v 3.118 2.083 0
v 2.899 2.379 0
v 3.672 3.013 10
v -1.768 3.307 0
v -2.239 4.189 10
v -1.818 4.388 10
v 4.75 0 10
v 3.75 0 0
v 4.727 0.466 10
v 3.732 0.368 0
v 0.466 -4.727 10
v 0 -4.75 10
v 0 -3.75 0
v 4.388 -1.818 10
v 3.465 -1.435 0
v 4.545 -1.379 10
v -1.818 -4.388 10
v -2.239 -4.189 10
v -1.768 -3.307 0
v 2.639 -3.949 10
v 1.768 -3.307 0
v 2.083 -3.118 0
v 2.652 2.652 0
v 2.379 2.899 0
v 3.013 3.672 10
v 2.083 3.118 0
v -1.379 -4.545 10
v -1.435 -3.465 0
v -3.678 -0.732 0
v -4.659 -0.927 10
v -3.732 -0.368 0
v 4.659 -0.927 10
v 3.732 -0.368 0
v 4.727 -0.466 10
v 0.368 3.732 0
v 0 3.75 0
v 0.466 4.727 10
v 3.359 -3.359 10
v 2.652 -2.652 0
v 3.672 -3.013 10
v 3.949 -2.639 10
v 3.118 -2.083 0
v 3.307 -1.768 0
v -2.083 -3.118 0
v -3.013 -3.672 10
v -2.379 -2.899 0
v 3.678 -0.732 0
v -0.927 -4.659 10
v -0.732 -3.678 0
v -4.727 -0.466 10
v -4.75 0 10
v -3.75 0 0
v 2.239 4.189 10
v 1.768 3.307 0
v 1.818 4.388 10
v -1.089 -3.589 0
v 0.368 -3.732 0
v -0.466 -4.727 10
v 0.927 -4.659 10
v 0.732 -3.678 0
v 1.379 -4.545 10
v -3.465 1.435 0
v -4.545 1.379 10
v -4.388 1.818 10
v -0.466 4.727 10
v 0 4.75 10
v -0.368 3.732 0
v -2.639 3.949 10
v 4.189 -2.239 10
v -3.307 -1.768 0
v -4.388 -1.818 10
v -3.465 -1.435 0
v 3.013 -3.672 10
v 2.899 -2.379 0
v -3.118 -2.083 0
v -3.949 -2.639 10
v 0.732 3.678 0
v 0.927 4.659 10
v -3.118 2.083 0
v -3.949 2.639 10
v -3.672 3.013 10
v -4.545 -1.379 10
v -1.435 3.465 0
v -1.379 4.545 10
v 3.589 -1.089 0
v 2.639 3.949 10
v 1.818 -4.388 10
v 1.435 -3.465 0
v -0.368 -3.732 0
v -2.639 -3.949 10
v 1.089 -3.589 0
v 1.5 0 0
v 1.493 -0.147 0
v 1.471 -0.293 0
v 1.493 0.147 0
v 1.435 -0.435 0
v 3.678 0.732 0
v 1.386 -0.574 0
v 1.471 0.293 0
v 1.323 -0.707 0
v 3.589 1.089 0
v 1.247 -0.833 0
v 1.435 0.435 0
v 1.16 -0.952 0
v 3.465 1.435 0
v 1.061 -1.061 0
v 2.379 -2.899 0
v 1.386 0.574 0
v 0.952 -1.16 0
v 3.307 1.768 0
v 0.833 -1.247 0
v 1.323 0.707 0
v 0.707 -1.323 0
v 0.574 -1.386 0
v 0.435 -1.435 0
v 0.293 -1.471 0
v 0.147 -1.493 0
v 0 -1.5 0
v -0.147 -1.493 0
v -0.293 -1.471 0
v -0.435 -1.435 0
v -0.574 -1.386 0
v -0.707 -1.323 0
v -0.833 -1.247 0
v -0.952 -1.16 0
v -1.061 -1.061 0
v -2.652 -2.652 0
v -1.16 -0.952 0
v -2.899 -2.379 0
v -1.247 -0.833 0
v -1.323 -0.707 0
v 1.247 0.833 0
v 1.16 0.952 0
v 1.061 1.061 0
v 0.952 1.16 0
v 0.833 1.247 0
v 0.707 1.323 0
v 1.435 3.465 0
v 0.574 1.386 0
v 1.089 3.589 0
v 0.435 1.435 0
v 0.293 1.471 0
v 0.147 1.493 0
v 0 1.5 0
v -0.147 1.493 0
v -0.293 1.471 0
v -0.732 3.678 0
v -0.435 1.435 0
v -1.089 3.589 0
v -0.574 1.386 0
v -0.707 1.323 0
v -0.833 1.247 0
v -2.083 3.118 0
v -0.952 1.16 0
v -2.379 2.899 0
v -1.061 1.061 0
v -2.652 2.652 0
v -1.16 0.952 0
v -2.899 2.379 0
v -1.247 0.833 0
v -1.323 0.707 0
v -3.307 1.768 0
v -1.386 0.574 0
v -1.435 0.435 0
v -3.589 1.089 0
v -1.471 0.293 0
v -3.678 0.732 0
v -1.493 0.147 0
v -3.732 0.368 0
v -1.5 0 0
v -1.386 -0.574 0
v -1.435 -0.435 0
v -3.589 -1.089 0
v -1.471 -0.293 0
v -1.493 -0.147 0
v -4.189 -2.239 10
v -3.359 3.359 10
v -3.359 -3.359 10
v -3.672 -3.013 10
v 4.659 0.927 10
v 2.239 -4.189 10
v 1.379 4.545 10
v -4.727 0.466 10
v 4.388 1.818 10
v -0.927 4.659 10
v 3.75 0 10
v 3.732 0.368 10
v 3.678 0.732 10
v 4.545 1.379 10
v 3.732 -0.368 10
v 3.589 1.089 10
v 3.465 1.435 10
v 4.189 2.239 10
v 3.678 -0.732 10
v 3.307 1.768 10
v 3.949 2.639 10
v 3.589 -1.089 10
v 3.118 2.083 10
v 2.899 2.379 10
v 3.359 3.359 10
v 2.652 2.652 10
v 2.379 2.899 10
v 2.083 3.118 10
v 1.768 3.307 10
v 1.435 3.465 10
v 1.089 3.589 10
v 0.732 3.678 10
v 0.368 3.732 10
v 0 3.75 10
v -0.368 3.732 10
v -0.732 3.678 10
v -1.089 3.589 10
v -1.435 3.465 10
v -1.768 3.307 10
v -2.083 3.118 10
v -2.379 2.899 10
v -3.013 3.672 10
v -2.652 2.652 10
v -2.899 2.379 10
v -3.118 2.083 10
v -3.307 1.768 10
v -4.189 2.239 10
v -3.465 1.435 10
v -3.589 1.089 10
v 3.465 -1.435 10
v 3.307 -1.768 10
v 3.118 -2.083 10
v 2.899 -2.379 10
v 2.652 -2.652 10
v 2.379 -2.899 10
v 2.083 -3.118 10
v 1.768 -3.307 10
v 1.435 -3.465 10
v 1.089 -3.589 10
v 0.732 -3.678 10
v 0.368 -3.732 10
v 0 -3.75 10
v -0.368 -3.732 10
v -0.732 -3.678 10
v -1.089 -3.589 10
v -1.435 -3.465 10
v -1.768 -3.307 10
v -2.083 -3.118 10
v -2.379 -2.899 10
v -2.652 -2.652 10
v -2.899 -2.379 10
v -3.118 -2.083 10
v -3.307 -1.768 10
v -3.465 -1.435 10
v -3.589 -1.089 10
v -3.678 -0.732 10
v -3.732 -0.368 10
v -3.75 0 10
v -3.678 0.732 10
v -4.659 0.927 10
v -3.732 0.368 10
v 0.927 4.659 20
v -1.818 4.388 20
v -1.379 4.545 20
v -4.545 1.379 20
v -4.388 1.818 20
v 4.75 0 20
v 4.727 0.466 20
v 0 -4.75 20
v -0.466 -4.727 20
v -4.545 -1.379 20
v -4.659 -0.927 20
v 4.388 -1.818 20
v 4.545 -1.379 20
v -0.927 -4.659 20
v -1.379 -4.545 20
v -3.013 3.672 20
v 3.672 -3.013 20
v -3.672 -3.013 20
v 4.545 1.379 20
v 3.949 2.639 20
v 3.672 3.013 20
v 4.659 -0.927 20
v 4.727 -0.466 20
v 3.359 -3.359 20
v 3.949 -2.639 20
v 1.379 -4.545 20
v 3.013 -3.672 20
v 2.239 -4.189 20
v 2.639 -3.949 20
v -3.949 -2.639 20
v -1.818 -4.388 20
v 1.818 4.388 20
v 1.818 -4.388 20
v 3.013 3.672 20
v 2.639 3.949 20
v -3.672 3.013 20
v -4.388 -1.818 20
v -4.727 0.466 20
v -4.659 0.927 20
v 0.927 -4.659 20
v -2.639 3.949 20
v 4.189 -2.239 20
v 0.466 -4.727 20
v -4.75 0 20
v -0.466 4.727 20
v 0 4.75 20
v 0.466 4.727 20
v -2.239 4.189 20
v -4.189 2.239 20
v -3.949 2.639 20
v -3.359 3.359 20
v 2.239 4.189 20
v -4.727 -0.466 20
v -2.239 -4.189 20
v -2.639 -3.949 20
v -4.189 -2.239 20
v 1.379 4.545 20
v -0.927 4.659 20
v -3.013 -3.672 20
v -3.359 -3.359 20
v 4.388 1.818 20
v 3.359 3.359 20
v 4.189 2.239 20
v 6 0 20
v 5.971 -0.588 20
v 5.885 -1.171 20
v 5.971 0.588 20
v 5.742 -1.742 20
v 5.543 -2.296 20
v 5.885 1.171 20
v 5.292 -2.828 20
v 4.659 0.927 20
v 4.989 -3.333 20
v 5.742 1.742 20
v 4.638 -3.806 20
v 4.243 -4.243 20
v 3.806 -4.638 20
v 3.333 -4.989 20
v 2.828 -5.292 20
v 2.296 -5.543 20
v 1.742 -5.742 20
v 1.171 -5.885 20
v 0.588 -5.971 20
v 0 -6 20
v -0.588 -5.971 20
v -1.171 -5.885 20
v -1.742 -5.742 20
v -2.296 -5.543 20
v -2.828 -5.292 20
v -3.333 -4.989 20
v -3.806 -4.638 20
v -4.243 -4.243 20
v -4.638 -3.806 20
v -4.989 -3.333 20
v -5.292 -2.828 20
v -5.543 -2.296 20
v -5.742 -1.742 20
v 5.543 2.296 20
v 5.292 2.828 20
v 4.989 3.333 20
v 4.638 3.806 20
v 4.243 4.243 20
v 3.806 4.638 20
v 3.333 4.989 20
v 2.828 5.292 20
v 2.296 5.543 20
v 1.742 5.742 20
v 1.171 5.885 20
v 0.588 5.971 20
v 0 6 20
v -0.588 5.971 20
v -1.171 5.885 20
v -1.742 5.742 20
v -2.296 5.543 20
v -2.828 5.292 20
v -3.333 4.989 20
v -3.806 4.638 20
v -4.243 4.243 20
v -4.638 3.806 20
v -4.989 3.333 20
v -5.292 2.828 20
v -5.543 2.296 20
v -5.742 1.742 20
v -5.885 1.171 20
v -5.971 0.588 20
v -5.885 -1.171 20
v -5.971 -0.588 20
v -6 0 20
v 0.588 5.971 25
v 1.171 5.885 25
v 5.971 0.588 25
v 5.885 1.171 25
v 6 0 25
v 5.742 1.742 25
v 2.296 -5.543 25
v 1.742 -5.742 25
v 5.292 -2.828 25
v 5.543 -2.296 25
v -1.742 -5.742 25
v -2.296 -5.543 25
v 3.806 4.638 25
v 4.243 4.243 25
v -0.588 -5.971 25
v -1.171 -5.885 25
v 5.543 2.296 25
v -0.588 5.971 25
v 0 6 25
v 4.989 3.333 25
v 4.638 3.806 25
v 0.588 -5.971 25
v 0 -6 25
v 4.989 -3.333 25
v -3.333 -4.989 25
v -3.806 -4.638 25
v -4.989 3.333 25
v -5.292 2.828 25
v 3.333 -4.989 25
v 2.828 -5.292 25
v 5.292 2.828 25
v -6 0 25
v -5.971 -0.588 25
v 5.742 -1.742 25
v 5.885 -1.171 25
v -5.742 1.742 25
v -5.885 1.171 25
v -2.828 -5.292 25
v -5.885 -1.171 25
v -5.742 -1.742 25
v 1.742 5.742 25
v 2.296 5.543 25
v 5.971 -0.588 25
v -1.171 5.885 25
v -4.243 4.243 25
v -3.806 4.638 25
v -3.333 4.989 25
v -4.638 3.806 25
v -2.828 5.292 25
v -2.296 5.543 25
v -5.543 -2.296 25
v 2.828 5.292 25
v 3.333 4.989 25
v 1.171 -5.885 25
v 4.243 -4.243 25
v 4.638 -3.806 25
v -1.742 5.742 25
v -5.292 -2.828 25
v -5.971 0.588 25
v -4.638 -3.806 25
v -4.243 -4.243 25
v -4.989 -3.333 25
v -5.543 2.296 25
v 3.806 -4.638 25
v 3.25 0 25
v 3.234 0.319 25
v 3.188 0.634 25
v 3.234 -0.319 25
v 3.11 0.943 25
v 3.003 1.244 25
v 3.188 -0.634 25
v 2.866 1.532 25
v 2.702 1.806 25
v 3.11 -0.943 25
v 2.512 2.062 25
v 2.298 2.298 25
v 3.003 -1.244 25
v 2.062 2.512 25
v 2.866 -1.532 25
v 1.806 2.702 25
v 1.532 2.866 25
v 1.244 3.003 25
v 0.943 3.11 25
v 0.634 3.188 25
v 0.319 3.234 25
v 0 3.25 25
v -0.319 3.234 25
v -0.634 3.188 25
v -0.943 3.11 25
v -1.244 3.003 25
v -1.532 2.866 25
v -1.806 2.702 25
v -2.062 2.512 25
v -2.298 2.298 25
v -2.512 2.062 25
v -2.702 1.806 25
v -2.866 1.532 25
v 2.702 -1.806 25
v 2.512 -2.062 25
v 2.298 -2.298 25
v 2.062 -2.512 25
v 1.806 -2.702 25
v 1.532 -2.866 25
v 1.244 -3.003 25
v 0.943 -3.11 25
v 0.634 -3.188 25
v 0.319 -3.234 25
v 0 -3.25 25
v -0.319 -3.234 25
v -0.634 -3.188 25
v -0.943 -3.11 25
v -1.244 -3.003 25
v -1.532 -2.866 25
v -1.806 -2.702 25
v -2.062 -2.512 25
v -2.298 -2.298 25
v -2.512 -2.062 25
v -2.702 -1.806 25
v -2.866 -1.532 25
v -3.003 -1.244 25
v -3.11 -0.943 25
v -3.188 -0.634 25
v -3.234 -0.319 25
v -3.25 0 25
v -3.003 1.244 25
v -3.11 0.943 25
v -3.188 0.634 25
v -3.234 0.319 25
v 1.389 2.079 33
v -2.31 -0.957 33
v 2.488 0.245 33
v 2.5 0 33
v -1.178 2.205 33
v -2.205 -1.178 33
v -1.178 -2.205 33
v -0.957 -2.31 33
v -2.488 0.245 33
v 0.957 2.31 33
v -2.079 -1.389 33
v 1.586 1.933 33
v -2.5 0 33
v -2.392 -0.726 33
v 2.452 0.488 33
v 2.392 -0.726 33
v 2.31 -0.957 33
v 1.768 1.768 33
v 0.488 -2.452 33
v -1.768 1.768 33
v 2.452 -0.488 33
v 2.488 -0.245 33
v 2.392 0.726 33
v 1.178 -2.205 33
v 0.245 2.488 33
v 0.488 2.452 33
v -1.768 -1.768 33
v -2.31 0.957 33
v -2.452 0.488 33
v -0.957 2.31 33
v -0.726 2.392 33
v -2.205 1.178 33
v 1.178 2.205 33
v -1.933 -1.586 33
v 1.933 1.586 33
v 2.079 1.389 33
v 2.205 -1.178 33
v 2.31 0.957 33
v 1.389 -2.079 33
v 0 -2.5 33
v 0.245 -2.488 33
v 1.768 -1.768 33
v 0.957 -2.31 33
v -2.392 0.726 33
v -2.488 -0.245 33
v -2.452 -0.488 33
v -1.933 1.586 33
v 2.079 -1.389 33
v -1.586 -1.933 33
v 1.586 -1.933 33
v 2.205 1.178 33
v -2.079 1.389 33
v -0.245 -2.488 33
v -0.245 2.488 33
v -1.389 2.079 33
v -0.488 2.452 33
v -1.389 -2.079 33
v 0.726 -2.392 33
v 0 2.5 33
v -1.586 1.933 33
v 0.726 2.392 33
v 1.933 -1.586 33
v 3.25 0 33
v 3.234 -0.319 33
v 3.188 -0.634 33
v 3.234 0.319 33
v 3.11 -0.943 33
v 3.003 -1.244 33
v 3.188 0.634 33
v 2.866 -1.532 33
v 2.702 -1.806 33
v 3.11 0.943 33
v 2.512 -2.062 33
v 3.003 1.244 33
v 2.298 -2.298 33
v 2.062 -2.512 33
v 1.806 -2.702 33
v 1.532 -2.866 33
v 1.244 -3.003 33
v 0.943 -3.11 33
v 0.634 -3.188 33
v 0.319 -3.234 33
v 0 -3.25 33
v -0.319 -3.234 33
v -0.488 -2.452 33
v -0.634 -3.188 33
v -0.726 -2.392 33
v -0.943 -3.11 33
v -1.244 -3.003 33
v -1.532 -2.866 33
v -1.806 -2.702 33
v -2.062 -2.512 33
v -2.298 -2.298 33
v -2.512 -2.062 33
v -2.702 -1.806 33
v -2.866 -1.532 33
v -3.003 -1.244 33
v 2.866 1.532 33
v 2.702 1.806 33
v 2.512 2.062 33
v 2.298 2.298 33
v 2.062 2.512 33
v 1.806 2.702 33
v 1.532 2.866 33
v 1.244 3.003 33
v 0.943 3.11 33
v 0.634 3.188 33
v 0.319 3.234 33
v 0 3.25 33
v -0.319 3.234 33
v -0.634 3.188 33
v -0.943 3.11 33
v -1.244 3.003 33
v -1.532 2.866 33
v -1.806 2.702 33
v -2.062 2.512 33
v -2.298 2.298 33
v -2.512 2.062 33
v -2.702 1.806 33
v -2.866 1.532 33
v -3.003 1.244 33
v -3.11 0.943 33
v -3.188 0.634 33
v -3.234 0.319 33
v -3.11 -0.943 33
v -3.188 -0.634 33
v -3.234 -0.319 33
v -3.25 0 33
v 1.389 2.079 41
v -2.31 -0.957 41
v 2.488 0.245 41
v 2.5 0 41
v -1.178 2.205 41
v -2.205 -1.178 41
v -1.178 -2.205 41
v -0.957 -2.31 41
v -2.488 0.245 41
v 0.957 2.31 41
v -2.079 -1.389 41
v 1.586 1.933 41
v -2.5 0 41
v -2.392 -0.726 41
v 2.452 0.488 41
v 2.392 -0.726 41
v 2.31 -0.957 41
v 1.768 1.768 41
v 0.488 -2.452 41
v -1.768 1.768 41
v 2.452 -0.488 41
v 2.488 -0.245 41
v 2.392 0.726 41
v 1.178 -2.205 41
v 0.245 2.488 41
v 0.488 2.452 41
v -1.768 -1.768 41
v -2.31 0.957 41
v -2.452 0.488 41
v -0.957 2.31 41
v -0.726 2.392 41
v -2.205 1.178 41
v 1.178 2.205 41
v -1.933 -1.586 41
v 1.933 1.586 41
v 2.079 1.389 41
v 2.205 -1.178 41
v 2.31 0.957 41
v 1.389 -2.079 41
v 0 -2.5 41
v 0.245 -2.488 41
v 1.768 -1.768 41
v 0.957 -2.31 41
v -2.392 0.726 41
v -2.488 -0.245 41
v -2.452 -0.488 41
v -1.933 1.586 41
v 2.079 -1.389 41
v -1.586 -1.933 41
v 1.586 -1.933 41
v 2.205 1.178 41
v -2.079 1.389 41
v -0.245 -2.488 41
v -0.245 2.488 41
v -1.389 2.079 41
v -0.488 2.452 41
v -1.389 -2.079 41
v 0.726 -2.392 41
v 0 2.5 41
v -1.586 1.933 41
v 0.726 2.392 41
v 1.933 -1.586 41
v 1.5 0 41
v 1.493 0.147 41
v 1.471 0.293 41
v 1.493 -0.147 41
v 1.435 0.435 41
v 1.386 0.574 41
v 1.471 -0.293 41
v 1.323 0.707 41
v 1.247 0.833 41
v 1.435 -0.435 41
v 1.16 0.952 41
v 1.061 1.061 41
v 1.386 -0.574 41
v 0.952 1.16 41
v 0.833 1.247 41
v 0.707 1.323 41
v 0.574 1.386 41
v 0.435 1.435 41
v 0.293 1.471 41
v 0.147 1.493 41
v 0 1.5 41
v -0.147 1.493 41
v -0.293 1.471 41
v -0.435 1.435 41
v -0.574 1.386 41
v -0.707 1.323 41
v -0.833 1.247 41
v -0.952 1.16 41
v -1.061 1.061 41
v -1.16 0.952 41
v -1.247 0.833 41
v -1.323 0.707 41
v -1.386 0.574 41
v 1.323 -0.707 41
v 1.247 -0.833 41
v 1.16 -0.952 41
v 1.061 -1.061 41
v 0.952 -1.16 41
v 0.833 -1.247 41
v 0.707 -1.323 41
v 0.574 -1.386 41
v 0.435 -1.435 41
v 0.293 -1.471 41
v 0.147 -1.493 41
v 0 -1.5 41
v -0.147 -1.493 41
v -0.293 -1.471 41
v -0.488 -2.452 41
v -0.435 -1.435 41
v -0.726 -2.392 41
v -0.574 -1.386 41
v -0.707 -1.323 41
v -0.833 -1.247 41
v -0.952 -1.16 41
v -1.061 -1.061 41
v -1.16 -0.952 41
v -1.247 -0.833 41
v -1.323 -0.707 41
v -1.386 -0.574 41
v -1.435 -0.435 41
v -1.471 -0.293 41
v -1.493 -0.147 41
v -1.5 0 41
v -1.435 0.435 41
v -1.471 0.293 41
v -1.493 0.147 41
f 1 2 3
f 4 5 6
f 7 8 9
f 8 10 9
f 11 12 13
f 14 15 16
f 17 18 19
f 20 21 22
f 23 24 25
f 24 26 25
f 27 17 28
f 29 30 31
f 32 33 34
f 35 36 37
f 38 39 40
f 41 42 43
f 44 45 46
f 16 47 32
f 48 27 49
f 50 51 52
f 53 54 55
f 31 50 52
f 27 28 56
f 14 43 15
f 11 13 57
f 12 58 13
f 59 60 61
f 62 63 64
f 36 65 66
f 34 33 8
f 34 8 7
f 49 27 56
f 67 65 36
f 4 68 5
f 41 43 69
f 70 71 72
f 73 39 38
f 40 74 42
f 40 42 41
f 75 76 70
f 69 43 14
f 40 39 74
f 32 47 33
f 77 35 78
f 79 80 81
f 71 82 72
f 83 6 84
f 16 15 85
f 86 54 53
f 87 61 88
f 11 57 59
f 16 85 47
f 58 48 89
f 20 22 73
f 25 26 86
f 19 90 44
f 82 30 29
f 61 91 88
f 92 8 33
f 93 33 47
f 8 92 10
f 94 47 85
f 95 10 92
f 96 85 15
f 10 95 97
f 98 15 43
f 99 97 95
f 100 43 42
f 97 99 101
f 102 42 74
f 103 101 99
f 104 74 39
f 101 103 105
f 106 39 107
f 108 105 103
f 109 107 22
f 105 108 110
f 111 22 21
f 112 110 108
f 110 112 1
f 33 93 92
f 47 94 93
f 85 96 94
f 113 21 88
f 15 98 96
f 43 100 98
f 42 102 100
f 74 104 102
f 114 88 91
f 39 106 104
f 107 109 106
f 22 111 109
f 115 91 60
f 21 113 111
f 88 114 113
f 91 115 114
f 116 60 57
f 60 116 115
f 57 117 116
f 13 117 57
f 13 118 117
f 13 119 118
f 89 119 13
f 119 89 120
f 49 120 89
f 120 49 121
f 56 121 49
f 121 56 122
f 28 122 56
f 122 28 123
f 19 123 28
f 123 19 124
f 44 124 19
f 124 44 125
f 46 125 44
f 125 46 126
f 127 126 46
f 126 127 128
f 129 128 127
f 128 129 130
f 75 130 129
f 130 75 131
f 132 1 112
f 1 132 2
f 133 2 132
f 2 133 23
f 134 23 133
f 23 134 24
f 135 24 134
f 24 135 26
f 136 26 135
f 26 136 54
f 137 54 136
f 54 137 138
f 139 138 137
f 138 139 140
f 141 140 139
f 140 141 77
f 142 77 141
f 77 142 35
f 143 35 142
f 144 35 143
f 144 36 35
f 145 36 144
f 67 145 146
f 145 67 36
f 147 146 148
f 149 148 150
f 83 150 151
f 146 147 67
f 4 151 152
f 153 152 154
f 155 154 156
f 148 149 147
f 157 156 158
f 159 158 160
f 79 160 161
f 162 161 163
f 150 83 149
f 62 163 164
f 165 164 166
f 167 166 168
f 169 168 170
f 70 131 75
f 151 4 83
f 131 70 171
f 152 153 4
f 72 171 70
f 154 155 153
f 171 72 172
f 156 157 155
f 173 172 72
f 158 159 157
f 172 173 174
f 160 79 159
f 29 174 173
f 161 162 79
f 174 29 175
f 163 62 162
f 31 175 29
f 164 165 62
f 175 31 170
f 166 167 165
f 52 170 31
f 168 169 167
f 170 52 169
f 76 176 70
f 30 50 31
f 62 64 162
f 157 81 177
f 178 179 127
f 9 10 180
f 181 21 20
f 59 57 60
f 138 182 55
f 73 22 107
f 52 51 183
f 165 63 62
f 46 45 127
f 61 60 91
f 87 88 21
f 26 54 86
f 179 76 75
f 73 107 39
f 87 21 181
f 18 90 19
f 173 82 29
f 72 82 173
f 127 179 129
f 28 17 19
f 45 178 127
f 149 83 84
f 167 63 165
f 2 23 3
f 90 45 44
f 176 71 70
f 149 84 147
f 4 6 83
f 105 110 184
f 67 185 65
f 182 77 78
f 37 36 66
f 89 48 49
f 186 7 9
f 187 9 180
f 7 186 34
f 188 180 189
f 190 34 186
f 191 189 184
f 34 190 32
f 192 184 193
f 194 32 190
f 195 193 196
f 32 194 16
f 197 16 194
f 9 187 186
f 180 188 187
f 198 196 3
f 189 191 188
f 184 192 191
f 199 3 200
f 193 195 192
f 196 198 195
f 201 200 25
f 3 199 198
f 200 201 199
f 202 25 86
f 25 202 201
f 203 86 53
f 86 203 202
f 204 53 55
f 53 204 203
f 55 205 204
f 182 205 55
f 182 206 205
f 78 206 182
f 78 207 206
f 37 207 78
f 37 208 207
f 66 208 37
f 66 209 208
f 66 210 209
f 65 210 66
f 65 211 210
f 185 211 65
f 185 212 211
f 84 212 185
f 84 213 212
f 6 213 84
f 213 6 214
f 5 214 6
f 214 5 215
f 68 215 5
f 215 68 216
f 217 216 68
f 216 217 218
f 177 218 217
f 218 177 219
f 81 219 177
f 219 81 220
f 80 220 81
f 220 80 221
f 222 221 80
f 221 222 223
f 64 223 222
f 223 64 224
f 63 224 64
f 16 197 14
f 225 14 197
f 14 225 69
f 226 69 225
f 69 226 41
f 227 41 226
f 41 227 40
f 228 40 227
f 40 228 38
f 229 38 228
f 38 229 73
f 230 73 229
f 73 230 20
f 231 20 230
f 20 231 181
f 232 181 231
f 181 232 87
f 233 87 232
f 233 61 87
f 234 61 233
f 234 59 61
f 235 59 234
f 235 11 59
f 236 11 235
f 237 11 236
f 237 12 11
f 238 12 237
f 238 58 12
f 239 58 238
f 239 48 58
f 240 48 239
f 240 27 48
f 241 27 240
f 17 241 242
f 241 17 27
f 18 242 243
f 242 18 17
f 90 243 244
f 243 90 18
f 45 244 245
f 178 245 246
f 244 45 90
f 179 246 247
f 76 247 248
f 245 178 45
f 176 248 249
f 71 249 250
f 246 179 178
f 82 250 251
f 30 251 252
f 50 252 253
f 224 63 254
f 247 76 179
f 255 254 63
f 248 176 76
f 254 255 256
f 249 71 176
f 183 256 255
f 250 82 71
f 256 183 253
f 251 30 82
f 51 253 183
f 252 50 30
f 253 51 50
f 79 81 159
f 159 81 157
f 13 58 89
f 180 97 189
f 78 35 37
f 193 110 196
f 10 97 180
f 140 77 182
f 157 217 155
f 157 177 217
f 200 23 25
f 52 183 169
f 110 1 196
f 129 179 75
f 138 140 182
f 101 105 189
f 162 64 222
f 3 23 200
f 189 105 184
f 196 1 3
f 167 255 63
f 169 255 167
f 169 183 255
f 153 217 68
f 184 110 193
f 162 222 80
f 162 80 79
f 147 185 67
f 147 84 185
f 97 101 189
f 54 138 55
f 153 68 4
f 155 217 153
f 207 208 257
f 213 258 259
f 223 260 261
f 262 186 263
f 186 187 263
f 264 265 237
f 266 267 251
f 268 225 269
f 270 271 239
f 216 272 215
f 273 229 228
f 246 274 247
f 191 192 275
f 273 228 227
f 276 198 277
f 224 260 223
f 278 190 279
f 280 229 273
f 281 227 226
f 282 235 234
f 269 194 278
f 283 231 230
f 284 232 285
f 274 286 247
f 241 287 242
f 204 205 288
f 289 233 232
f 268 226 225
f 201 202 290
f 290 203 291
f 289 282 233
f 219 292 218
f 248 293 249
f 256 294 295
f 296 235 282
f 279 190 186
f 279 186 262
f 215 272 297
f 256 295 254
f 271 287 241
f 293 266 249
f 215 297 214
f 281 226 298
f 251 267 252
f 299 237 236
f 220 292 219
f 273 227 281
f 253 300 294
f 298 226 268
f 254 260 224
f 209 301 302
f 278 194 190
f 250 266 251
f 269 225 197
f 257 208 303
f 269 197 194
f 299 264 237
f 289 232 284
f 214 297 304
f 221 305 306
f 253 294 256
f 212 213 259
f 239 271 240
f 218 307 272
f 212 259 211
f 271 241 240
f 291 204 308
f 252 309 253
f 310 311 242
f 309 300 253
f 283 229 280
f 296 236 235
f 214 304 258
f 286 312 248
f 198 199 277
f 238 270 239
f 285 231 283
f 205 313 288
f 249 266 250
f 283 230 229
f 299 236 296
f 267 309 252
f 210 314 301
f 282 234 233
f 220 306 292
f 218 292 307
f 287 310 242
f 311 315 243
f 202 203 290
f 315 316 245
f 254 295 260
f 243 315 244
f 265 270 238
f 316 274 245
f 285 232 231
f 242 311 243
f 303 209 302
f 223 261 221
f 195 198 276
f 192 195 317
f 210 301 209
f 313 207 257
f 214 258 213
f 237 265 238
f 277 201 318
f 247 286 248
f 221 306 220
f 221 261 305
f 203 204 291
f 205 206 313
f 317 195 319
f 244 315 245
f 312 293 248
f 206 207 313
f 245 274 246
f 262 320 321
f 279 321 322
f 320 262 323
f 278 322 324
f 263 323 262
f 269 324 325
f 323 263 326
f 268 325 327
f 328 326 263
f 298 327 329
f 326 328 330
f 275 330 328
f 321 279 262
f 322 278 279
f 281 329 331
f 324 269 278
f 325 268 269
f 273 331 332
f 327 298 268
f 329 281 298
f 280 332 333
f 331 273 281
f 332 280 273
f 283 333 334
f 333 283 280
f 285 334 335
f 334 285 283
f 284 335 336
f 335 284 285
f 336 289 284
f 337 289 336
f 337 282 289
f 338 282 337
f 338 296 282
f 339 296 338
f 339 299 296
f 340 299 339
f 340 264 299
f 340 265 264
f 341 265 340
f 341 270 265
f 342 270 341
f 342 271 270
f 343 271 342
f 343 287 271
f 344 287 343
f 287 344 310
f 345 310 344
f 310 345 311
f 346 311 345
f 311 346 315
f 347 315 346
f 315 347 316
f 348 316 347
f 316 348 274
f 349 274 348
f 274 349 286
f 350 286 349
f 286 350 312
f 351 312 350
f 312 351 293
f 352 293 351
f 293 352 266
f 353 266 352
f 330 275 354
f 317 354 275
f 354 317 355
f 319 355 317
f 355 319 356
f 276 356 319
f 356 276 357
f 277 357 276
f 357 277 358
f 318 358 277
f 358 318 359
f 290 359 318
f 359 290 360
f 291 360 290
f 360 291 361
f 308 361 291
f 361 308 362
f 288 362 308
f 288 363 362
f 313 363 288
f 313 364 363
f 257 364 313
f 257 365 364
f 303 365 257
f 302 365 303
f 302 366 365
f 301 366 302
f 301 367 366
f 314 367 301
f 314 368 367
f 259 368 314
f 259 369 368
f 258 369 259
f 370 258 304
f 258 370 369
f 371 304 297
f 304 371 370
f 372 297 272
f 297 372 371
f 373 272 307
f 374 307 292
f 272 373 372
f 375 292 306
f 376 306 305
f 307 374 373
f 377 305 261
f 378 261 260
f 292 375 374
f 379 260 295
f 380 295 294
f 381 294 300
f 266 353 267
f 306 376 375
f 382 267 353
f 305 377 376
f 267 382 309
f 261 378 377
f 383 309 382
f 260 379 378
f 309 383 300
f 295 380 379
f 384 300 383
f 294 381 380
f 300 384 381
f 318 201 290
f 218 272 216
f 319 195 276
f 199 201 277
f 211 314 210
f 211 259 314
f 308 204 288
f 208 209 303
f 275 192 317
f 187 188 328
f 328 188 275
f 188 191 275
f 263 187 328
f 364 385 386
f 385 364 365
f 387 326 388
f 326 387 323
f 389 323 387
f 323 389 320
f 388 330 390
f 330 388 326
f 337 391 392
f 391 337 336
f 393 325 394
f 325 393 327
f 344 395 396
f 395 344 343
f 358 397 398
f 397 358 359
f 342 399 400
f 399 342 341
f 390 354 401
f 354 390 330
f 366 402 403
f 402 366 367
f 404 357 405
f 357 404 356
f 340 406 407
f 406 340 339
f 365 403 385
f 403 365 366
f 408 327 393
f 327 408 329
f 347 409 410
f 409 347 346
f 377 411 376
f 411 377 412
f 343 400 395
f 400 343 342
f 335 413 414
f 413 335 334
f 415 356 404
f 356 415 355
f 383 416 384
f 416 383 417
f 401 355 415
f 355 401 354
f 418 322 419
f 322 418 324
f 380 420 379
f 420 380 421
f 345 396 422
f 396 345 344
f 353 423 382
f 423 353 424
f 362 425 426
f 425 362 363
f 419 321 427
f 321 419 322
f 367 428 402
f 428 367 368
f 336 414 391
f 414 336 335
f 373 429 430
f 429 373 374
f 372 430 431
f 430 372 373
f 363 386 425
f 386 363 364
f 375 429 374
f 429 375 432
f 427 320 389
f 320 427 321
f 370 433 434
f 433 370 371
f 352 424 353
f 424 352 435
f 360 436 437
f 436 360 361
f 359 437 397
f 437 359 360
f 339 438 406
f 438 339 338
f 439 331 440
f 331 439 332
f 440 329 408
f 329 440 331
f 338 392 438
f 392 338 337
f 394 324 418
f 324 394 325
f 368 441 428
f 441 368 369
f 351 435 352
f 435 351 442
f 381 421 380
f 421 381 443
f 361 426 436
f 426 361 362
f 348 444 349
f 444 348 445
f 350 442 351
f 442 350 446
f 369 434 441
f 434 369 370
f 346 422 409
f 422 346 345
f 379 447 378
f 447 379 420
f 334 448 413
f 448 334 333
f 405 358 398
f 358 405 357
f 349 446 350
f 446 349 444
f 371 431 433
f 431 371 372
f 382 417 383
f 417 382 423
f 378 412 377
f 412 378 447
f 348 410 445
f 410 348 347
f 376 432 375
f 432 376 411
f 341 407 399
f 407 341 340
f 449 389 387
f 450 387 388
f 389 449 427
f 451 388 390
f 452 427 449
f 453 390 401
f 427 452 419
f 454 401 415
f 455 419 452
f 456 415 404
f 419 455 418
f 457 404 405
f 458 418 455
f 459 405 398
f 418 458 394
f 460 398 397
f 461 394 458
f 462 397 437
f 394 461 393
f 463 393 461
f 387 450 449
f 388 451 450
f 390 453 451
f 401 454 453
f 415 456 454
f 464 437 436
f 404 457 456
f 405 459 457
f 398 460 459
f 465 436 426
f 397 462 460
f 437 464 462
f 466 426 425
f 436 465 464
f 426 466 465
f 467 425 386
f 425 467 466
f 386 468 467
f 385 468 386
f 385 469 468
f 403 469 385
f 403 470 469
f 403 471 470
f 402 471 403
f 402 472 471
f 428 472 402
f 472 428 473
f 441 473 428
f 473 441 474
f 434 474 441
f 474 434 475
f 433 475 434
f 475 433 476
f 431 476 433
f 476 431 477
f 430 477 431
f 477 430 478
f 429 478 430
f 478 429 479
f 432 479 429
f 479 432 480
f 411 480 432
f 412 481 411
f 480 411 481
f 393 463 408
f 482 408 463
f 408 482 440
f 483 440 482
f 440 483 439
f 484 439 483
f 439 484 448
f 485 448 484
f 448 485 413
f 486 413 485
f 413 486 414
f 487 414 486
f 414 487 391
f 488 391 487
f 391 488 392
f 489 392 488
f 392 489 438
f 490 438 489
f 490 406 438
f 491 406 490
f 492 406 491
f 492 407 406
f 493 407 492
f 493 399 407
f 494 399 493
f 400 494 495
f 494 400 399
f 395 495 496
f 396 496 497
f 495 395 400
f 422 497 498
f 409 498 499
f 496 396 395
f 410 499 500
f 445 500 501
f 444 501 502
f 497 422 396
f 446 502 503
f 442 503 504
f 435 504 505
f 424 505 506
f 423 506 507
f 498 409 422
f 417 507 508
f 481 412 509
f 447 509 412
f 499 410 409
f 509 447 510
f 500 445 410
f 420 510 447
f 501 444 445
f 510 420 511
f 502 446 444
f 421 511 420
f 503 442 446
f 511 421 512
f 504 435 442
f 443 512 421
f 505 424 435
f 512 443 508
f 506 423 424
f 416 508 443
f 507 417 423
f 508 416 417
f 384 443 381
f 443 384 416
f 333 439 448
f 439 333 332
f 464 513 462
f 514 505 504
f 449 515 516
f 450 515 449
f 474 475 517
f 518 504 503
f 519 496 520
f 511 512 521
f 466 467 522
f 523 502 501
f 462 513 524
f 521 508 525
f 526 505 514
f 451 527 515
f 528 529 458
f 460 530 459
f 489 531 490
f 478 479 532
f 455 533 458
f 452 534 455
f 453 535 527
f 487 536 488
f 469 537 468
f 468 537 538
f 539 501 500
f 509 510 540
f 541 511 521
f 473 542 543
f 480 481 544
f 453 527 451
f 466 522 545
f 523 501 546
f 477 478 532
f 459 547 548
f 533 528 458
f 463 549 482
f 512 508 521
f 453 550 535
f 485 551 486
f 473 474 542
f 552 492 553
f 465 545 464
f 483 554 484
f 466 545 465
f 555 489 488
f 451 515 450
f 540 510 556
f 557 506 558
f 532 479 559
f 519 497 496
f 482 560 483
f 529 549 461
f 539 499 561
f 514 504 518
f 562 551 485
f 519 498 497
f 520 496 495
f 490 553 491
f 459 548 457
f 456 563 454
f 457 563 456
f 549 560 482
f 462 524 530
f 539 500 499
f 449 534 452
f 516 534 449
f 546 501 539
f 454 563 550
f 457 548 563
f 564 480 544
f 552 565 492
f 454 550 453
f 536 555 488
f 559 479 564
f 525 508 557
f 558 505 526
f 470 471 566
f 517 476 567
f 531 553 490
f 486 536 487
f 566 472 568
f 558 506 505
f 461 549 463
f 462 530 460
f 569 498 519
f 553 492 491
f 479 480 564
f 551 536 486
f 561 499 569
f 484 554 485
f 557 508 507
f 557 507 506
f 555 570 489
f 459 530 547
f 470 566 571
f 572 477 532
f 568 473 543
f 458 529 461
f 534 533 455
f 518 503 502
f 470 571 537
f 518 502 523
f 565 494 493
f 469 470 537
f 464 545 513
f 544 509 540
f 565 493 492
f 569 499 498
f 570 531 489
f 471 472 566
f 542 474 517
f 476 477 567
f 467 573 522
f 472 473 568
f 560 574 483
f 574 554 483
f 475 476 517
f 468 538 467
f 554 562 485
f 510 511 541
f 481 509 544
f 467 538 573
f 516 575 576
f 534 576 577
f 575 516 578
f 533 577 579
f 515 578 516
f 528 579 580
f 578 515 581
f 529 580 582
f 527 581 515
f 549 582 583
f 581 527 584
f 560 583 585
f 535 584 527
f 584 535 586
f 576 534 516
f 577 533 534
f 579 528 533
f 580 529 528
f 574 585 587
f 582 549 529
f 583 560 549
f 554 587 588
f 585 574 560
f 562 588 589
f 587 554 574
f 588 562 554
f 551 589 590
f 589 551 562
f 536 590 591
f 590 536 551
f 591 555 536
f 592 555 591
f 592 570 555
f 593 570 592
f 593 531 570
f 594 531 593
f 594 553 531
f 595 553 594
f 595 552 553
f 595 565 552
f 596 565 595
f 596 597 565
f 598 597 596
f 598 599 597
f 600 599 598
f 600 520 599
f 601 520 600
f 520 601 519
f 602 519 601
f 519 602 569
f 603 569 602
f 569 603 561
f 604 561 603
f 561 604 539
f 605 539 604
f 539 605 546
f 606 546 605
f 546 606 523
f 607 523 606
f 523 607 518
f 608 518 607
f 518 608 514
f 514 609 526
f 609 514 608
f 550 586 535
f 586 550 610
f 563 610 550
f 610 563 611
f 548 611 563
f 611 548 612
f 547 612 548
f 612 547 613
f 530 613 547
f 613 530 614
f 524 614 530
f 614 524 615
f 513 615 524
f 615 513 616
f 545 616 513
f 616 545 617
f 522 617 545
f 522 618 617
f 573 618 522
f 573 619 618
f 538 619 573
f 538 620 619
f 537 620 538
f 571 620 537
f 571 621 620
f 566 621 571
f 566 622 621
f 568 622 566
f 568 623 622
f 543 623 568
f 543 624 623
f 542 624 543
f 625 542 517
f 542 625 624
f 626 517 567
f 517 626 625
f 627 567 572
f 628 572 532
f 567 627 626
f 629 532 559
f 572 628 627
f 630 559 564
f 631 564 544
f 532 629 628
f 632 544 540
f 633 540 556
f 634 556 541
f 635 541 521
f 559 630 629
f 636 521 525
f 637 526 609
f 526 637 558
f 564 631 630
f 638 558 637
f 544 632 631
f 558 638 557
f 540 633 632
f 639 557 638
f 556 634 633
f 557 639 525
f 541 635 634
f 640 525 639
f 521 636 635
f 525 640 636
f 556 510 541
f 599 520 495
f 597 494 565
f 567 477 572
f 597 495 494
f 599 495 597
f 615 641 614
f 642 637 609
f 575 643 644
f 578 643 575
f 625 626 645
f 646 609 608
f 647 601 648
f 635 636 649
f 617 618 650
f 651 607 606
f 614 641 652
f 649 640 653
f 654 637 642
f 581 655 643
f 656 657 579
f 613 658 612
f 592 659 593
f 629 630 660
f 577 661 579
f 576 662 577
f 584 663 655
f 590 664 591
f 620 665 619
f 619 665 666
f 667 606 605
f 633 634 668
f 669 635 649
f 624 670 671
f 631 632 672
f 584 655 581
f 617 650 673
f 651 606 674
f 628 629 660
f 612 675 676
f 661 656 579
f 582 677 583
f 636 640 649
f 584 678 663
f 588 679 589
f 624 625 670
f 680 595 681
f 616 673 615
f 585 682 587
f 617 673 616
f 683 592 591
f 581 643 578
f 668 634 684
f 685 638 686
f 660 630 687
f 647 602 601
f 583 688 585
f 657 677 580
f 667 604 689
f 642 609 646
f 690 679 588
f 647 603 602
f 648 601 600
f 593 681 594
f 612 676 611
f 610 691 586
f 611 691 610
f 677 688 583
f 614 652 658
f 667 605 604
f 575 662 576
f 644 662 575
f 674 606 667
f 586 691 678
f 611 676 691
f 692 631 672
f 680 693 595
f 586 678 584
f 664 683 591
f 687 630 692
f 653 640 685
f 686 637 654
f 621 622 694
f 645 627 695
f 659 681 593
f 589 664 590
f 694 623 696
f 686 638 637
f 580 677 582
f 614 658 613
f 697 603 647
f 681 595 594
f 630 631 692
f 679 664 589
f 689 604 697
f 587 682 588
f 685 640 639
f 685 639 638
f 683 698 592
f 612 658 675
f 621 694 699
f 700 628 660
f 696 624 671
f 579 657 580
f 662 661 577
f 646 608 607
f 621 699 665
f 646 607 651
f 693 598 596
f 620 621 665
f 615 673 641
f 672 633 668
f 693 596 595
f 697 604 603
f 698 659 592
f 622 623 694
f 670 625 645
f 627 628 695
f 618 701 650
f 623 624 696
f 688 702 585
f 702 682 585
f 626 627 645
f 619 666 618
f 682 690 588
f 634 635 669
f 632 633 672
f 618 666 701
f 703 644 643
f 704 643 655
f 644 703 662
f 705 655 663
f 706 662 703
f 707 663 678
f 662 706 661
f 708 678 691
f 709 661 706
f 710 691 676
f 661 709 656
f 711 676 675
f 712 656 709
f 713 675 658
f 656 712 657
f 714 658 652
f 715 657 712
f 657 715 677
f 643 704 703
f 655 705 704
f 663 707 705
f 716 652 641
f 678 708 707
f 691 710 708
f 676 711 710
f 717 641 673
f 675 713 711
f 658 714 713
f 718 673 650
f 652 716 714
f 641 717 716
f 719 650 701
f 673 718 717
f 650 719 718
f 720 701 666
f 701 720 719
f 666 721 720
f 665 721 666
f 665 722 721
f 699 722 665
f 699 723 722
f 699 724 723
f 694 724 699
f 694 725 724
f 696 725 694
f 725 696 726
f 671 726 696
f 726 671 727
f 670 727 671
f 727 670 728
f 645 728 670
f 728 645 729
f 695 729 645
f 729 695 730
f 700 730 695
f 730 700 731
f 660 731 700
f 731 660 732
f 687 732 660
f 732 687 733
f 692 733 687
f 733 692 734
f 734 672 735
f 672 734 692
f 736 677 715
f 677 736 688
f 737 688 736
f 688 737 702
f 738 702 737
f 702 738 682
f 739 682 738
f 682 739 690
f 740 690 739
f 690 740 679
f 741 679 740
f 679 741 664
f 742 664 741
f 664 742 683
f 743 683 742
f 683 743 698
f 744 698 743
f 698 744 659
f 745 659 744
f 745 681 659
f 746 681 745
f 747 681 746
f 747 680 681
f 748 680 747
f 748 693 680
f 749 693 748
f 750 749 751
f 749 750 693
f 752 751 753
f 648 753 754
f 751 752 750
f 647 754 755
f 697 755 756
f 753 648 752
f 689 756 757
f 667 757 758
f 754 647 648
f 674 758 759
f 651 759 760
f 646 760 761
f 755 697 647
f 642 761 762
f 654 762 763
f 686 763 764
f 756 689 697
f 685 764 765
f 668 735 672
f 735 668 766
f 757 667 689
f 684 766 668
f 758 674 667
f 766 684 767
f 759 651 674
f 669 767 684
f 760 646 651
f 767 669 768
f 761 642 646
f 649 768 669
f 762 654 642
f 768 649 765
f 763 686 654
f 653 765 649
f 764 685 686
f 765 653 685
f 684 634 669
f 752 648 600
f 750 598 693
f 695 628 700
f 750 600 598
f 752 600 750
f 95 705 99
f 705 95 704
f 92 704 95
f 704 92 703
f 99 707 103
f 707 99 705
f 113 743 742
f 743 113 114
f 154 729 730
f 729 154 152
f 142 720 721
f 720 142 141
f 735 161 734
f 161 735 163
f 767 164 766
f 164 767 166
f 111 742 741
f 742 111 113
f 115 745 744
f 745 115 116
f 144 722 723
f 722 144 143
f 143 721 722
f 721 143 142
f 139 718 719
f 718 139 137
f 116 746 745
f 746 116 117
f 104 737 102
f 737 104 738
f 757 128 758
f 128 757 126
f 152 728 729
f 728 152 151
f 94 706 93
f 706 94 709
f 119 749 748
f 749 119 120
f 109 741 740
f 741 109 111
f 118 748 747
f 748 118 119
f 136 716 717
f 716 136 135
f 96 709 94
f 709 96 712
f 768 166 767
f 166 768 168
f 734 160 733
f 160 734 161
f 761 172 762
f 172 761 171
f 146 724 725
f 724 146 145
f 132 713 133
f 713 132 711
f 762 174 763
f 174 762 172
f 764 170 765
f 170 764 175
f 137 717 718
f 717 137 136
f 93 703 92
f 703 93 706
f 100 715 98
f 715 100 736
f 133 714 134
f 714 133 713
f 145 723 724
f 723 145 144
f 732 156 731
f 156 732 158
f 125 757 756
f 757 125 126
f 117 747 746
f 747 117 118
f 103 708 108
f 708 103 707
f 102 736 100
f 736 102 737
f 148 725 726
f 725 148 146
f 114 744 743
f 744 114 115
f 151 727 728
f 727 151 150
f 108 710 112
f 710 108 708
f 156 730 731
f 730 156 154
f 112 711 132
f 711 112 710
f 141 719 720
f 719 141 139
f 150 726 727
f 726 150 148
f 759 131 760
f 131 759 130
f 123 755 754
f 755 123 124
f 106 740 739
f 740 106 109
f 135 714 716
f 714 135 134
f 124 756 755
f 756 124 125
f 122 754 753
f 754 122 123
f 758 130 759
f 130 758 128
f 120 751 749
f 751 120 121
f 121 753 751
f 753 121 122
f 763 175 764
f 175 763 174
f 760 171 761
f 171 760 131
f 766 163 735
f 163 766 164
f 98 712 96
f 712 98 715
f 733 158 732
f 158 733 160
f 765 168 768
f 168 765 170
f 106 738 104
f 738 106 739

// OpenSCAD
// Straight hose-barb reducer
// Designed for 8mm and 5mm ID tubing with a 3mm central bore.

// --- Dimensions ---
bore_d       = 3.0;    // Central bore diameter
barb8_h      = 10.0;   // Height of one 8mm barb
barb8_d_bot  = 7.5;    // Bottom diameter of 8mm barb
barb8_d_top  = 9.5;    // Top diameter of 8mm barb
barb5_h      = 8.0;    // Height of one 5mm barb
barb5_d_bot  = 6.5;    // Bottom diameter of 5mm barb
barb5_d_top  = 5.0;    // Top diameter of 5mm barb
collar_d     = 12.0;   // Diameter of the transition collar
collar_h     = 5.0;    // Height of the transition collar (25 - 20)

// --- Derived Geometry ---
total_h_8mm  = barb8_h * 2; // 20mm
total_h_5mm  = barb5_h * 2; // 16mm
total_height = total_h_8mm + collar_h + total_h_5mm; // 20 + 5 + 16 = 41mm

$fn = 64;

// --- Modules ---

// A single barb for the 8mm side (tapering up)
module barb8_segment() {
    cylinder(h = barb8_h, d1 = barb8_d_bot, d2 = barb8_d_top);
}

// A single barb for the 5mm side (tapering up)
module barb5_segment() {
    cylinder(h = barb5_h, d1 = barb5_d_bot, d2 = barb5_d_top);
}

// --- Final Assembly ---

difference() {
    // Main Body
    union() {
        // 8mm Barb Section (z = 0 to 20)
        // First barb
        barb8_segment();
        // Second barb (stacked)
        translate([0, 0, barb8_h]) barb8_segment();
        
        // Transition Collar (z = 20 to 25)
        translate([0, 0, total_h_8mm]) 
            cylinder(h = collar_h, d = collar_d);
            
        // 5mm Barb Section (z = 25 to 41)
        // First barb
        translate([0, 0, total_h_8mm + collar_h]) 
            barb5_segment();
        // Second barb (stacked)
        translate([0, 0, total_h_8mm + collar_h + barb5_h]) 
            barb5_segment();
    }

    // Central Bore (runs through full length)
    // We extend the cylinder slightly beyond the height to ensure a clean cut
    translate([0, 0, -1]) 
        cylinder(h = total_height + 2, d = bore_d);
}
